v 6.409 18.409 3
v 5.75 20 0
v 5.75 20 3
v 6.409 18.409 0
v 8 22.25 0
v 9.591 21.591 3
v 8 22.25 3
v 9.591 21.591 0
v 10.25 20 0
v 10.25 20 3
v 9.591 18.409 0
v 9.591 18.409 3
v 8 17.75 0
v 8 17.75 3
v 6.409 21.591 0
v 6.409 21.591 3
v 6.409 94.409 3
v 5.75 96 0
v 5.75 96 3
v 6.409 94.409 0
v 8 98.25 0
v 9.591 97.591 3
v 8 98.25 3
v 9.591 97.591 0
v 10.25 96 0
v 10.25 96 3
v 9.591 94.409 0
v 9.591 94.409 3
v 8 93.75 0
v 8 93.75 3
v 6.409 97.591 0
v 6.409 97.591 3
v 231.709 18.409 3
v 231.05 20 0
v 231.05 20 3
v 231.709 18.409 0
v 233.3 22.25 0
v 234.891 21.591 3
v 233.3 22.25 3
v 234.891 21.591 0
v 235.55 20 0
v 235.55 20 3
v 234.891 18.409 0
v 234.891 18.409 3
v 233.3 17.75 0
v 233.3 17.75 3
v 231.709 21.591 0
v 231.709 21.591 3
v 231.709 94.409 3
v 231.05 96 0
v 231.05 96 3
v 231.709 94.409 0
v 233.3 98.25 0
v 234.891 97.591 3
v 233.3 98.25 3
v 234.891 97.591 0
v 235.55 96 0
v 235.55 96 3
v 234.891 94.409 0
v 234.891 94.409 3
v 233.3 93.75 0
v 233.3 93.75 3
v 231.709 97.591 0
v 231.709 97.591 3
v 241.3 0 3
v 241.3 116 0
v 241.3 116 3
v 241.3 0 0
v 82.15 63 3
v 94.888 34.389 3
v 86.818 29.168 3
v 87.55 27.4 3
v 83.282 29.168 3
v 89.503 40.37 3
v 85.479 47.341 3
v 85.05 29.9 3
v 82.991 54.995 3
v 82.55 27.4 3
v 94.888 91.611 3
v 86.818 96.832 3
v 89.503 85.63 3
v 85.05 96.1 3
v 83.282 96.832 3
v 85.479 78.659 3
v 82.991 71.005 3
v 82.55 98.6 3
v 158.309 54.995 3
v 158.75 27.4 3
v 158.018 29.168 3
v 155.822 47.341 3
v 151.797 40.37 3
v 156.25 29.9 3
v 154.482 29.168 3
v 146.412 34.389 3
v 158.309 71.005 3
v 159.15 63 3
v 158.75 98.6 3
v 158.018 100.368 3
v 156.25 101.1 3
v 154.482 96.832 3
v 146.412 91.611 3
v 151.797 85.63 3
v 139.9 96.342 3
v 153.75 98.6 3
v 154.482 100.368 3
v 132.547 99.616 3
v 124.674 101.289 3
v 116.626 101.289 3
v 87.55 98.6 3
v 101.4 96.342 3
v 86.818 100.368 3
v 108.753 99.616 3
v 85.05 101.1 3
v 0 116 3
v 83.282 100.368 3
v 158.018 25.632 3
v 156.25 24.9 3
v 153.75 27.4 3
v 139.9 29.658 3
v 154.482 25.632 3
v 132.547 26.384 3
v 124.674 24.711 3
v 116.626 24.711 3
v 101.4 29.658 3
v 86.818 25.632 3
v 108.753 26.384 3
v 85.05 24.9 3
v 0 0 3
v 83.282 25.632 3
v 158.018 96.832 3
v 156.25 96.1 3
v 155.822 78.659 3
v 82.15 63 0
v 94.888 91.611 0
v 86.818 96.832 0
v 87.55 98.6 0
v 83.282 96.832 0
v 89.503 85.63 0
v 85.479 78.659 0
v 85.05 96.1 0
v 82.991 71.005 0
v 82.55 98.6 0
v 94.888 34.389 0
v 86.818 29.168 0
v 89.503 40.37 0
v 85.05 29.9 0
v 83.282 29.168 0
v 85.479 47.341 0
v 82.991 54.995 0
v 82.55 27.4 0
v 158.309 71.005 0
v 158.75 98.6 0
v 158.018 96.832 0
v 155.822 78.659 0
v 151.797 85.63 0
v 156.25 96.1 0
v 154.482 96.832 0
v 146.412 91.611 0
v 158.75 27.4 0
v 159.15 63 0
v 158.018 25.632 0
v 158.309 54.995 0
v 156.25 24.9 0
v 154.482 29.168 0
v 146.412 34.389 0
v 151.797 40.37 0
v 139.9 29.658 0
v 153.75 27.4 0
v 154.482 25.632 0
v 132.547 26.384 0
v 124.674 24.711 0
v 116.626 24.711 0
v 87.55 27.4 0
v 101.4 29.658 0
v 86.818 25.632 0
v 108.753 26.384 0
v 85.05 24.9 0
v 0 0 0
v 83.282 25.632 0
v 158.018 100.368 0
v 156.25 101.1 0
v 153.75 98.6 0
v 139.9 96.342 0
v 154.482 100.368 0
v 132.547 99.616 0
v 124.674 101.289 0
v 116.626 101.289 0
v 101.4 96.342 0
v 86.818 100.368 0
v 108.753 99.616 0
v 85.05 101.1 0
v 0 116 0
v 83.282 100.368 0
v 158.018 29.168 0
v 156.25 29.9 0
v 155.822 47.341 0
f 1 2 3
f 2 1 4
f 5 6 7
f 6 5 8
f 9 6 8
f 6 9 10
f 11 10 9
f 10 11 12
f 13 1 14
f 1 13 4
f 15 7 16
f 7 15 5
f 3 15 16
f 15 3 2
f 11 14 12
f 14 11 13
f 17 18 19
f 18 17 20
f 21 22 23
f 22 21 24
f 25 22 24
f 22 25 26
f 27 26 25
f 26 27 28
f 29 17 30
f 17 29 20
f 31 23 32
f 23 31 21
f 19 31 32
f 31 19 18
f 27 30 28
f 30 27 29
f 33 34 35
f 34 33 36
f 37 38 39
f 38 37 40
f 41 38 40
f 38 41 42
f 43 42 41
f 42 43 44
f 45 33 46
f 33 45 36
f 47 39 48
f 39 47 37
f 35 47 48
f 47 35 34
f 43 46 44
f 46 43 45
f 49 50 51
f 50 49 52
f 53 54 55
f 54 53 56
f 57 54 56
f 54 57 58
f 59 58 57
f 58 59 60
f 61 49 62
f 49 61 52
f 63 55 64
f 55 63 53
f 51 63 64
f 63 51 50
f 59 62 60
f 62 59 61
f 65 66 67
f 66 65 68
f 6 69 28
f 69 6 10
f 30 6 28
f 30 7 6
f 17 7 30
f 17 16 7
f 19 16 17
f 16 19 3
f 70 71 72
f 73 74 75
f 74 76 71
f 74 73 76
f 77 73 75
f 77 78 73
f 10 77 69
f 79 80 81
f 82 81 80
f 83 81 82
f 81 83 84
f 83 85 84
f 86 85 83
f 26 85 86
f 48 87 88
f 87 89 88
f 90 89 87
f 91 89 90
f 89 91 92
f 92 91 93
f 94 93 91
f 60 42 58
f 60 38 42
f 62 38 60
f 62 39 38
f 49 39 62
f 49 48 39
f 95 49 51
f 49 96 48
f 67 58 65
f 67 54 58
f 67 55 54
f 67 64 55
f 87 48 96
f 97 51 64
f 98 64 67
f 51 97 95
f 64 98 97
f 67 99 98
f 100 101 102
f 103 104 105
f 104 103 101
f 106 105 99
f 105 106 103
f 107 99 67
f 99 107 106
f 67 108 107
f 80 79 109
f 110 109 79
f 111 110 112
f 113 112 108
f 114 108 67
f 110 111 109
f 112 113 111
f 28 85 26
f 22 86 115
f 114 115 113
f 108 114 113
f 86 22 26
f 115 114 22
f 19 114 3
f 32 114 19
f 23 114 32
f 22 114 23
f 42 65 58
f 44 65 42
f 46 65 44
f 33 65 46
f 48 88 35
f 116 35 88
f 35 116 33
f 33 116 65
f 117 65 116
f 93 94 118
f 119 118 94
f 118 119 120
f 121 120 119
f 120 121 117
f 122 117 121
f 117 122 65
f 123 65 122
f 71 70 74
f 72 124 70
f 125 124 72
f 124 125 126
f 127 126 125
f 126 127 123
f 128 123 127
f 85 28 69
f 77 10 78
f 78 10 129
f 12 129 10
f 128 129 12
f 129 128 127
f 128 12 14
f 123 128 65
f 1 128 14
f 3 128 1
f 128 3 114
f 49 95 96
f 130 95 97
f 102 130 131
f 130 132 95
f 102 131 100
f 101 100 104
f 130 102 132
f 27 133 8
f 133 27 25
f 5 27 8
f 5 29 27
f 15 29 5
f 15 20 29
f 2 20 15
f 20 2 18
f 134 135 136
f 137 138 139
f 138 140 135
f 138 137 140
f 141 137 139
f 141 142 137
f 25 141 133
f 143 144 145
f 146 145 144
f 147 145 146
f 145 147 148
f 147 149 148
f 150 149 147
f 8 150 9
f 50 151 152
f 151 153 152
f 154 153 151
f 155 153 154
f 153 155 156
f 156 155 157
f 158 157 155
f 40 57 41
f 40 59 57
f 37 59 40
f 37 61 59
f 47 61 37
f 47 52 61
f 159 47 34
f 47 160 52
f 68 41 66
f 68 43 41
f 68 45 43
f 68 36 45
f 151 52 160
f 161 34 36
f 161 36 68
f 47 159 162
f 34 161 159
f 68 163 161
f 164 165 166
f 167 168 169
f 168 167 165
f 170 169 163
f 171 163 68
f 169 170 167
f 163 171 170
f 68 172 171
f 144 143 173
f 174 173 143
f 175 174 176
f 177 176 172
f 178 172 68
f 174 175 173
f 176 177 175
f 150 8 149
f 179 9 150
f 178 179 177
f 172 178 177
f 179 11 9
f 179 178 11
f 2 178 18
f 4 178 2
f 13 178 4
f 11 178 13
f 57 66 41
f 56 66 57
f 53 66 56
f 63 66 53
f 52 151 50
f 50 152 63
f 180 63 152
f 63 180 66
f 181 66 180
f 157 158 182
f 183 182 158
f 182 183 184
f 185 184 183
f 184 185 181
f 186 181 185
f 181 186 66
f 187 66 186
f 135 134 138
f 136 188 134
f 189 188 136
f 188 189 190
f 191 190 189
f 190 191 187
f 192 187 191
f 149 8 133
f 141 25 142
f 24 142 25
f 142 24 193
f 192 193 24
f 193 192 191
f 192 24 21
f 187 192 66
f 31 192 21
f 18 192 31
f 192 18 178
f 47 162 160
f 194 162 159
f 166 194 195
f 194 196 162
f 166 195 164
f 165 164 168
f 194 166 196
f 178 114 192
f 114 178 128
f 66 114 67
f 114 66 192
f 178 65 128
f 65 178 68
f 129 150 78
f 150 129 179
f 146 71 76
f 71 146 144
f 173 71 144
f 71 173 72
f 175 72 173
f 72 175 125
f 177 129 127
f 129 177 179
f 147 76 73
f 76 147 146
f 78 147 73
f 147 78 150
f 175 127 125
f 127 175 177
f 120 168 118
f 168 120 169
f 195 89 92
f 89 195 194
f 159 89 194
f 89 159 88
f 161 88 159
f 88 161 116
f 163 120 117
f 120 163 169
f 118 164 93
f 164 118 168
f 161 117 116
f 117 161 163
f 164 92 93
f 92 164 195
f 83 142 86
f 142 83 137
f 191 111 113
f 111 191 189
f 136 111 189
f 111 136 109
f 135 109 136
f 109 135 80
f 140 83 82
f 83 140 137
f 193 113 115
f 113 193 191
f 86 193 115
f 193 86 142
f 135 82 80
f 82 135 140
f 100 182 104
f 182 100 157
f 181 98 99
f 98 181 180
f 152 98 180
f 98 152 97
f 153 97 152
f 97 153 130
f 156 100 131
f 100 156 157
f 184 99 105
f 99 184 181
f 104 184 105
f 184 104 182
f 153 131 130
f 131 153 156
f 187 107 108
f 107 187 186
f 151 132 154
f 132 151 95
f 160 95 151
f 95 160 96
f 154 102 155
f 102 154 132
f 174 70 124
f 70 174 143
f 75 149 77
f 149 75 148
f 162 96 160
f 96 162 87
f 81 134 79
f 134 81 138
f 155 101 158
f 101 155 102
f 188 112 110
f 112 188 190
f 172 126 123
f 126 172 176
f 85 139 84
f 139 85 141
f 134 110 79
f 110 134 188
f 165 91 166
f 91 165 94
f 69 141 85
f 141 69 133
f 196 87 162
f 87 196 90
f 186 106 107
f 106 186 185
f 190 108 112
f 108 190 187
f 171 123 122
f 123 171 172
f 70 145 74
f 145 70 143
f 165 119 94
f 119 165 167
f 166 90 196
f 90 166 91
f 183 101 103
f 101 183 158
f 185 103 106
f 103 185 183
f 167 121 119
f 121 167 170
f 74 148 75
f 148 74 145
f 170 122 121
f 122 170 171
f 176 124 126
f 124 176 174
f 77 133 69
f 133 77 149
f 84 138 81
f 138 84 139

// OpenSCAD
// file: Piller.scad
use <Bottom.scad>;

function zOffset1() = getPillerThickness() * 1.5;
function zOffset2() = getPillerThickness() * 2;

module singlePiller()
{
	difference()
	{
		union()
		{
			translate([0,0,getWallHeight()/2]) cube([getPillerThickness(), getPillerThickness(), getWallHeight()], center=true);
		}

		cylinder(d=getHoleSize(),h=getWallHeight());
		translate([0,getPillerThickness()/2,zOffset1()]) rotate([90,0,0]) cylinder(d=getHoleSize(),h=getPillerThickness());
		translate([getPillerThickness()/2 * -1,0,zOffset2()]) rotate([0,90,0]) cylinder(d=getHoleSize(),h=getPillerThickness());
		translate([0,getPillerThickness()/2,getWallHeight() - zOffset1()]) rotate([90,0,0]) cylinder(d=getHoleSize(),h=getPillerThickness());
		translate([getPillerThickness()/2 * -1,0,getWallHeight() - zOffset2()]) rotate([0,90,0]) cylinder(d=getHoleSize(),h=getPillerThickness());
	}
}

module doublePiller()
{
	union()
	{
		singlePiller();
		translate([getPillerThickness(),0,0]) singlePiller();
	}
}

//doublePiller();
singlePiller();
// file: CircuitHolder.scad
//$fn=500;

$yOffset=77.5;
$xOffset=75.5;

function getCircuitHolderX() = $xOffset;
function getCircuitHolderY() = $yOffset;

module circuitHole()
{
	difference()
	{
		cylinder(d=8,h=10);
		circuitHoleCenter();
	}
}

module circuitHoleCenter()
{
	translate([0,0,-1]) cylinder(d=5.25,h=11);
}

module circuitHolder()
{
	circuitHole();
	translate([$xOffset,0,0]) circuitHole();
	translate([$xOffset,$yOffset,0]) circuitHole();
	translate([0,$yOffset,0]) circuitHole();
}

module circuitHolderHoles()
{
	circuitHoleCenter();
	translate([$xOffset,0,0]) circuitHoleCenter();
	translate([$xOffset,$yOffset,0]) circuitHoleCenter();
	translate([0,$yOffset,0]) circuitHoleCenter();
}

/*difference()
{
	cube([95,95,0.5]);
	translate([5,5,0]) circuitHolderHoles();
}*/
//translate([5,5,0]) circuitHolder();
// file: PowerHoles.scad
$powerHoleX=151;
$powerHoleY=25;

module powerScrewHole()
{
	translate([0,0,-1]) cylinder(d=4.5,h=10);
}

function getPowerHoleX() = $powerHoleX;
function getPowerHoleY() = $powerHoleY;

module powerHoles()
{
	powerScrewHole();
	translate([0,$powerHoleY,0]) powerScrewHole();
	translate([$powerHoleX,0,0]) powerScrewHole();
	translate([$powerHoleX,$powerHoleY,0]) powerScrewHole();
}

powerHoles();
// file: SideWall.scad
use <PowerHoles.scad>;
use <Bottom.scad>;
use <Piller.scad>;

module sideWall()
{
	difference()
	{
		union()
		{
			cube([getBottomX(),getWallHeight(),getWallThickness()]);
		}
		translate([getWallThickness()+(getPillerThickness()/2),zOffset2(),-1]) boltHole();
		translate([(getPillerThickness()/2)+getWallThickness(),getWallHeight()  - zOffset2(),-1]) boltHole();
		translate([getBottomX()-(getPillerThickness()/2)-getWallThickness(), zOffset2(),-1]) boltHole();
		translate([getBottomX()-(getPillerThickness()/2)-getWallThickness(),getWallHeight() - zOffset2(),-1]) boltHole();
	}
}

sideWall();
// file: Bottom.scad
use <PowerHoles.scad>;
use <CircuitHolder.scad>;

$bottomX=241.3;
$bottomY=260.35;
$bottomZ=5;
$wallThickness=3;
$pillerThickness=10;
$connectorLength=20;
$connectorWidth=10;
$holeSize=3.9;
$throughHoleSize=4.5;
$wallHeight=116;


function getWallThickness() = $wallThickness;
function getHoleSize() = $holeSize;
function getWallHeight() = $wallHeight;
function getPillerThickness() = $pillerThickness;
function getBottomX() = $bottomX;
function getBottomY() = $bottomY;
function getBottomZ() = $bottomZ;
function getConnectorLength() = $connectorLength;
function getConnectorWidth() = $connectorWidth;
function getThroughHoleSize() = $throughHoleSize;

module boltHole()
{
	union()
	{
		cylinder(d=$throughHoleSize,h=20);
		translate([0,0,$pillerThickness]) cube([$pillerThickness,$pillerThickness,$pillerThickness], center=true);
	}
}

// Bottom cube
module bottomFront(bottomZ=$bottomZ)
{
	union()
	{
		difference()
		{
			cube([$bottomX,$bottomY/2,bottomZ]);
			translate([($pillerThickness/2)+$wallThickness,($pillerThickness/2)+$wallThickness,0]) boltHole();
			translate([($pillerThickness/2)+$wallThickness,($bottomY/2)-($pillerThickness/2),0]) boltHole();
			translate([$bottomX-(($pillerThickness/2)+$wallThickness),($pillerThickness/2)+$wallThickness,0]) boltHole();
			translate([$bottomX-($pillerThickness/2)-$wallThickness,($bottomY/2)-($pillerThickness/2),0]) boltHole();
			translate([($bottomX/2) + (getPowerHoleX()/2*-1),(($bottomY/2)*0.25)+20,0]) powerHoles();
		}
		translate([($bottomX*0.25)-($connectorWidth/2),($bottomY/2)-($connectorLength/2),0]) cube([$connectorWidth, $connectorLength,bottomZ]);
		translate([($bottomX*0.75)-($connectorWidth/2),($bottomY/2)-($connectorLength/2),0]) cube([$connectorWidth, $connectorLength,bottomZ]);
	}
}

module bottomBack(bottomZ=$bottomZ)
{
	union()
	{
		difference()
		{
			cube([$bottomX,$bottomY/2,bottomZ]);
			translate([($pillerThickness/2)+$wallThickness,($pillerThickness/2)+$wallThickness,0]) #boltHole();
			translate([($pillerThickness/2)+$wallThickness,($bottomY/2)-($pillerThickness/2),0]) #boltHole();
			translate([$bottomX-(($pillerThickness/2)+$wallThickness),($pillerThickness/2)+$wallThickness,0]) #boltHole();
			translate([$bottomX-($pillerThickness/2)-$wallThickness,($bottomY/2)-($pillerThickness/2),0]) #boltHole();
			translate([($bottomX*0.25)-($connectorWidth/2),($bottomY/2)-($connectorLength/2),0]) #cube([$connectorWidth, $connectorLength,bottomZ]);
			translate([($bottomX*0.75)-($connectorWidth/2),($bottomY/2)-($connectorLength/2),0]) #cube([$connectorWidth, $connectorLength,bottomZ]);
			translate([($bottomX*0.5) + (getCircuitHolderX()/2*-1),($bottomY*0.25) + (getCircuitHolderY()/2*-1),0]) #circuitHolderHoles();
		}
		translate([($bottomX*0.5) + (getCircuitHolderX()/2*-1),($bottomY*0.25) + (getCircuitHolderY()/2*-1),0]) #circuitHolder();
	}
}


bottomBack();
// main file
use <Bottom.scad>;
use <SideWall.scad>;

//$fn=500;
$fanSize=80;
$fanScrewSize=5;
$fanScrewOffset=1.9;
$fanHoleSize=77;

function getFanSize() = $fanSize;

module fanScrewHole(holeSize)
{
	translate([($fanScrewSize/2),($fanScrewSize/2),0]) #cylinder(d=holeSize,h=getWallThickness()*2);
}

module fanHoles(holeSize=$fanScrewSize)
{
	//cube([$fanSize,$fanSize,1]);
	translate([$fanScrewOffset,$fanScrewOffset,-1]) fanScrewHole(holeSize);
	translate([$fanSize-$fanScrewSize-$fanScrewOffset,$fanScrewOffset,-1]) fanScrewHole(holeSize);
	translate([$fanScrewOffset,$fanSize-$fanScrewSize-$fanScrewOffset,-1]) fanScrewHole(holeSize);
	translate([$fanSize-$fanScrewSize-$fanScrewOffset,$fanSize-$fanScrewSize-$fanScrewOffset,-1]) fanScrewHole(holeSize);
	translate([($fanHoleSize/2)+(($fanSize-$fanHoleSize)/2),($fanHoleSize/2)+(($fanSize-$fanHoleSize)/2),-1]) #cylinder(d=$fanHoleSize,h=getWallThickness()*2);
}

difference()
{
	sideWall();
	translate([(getBottomX()/2)-(getFanSize()/2),(getWallHeight()/2)-(getFanSize()/2)+5,0]) fanHoles($fanScrewSize);
}
